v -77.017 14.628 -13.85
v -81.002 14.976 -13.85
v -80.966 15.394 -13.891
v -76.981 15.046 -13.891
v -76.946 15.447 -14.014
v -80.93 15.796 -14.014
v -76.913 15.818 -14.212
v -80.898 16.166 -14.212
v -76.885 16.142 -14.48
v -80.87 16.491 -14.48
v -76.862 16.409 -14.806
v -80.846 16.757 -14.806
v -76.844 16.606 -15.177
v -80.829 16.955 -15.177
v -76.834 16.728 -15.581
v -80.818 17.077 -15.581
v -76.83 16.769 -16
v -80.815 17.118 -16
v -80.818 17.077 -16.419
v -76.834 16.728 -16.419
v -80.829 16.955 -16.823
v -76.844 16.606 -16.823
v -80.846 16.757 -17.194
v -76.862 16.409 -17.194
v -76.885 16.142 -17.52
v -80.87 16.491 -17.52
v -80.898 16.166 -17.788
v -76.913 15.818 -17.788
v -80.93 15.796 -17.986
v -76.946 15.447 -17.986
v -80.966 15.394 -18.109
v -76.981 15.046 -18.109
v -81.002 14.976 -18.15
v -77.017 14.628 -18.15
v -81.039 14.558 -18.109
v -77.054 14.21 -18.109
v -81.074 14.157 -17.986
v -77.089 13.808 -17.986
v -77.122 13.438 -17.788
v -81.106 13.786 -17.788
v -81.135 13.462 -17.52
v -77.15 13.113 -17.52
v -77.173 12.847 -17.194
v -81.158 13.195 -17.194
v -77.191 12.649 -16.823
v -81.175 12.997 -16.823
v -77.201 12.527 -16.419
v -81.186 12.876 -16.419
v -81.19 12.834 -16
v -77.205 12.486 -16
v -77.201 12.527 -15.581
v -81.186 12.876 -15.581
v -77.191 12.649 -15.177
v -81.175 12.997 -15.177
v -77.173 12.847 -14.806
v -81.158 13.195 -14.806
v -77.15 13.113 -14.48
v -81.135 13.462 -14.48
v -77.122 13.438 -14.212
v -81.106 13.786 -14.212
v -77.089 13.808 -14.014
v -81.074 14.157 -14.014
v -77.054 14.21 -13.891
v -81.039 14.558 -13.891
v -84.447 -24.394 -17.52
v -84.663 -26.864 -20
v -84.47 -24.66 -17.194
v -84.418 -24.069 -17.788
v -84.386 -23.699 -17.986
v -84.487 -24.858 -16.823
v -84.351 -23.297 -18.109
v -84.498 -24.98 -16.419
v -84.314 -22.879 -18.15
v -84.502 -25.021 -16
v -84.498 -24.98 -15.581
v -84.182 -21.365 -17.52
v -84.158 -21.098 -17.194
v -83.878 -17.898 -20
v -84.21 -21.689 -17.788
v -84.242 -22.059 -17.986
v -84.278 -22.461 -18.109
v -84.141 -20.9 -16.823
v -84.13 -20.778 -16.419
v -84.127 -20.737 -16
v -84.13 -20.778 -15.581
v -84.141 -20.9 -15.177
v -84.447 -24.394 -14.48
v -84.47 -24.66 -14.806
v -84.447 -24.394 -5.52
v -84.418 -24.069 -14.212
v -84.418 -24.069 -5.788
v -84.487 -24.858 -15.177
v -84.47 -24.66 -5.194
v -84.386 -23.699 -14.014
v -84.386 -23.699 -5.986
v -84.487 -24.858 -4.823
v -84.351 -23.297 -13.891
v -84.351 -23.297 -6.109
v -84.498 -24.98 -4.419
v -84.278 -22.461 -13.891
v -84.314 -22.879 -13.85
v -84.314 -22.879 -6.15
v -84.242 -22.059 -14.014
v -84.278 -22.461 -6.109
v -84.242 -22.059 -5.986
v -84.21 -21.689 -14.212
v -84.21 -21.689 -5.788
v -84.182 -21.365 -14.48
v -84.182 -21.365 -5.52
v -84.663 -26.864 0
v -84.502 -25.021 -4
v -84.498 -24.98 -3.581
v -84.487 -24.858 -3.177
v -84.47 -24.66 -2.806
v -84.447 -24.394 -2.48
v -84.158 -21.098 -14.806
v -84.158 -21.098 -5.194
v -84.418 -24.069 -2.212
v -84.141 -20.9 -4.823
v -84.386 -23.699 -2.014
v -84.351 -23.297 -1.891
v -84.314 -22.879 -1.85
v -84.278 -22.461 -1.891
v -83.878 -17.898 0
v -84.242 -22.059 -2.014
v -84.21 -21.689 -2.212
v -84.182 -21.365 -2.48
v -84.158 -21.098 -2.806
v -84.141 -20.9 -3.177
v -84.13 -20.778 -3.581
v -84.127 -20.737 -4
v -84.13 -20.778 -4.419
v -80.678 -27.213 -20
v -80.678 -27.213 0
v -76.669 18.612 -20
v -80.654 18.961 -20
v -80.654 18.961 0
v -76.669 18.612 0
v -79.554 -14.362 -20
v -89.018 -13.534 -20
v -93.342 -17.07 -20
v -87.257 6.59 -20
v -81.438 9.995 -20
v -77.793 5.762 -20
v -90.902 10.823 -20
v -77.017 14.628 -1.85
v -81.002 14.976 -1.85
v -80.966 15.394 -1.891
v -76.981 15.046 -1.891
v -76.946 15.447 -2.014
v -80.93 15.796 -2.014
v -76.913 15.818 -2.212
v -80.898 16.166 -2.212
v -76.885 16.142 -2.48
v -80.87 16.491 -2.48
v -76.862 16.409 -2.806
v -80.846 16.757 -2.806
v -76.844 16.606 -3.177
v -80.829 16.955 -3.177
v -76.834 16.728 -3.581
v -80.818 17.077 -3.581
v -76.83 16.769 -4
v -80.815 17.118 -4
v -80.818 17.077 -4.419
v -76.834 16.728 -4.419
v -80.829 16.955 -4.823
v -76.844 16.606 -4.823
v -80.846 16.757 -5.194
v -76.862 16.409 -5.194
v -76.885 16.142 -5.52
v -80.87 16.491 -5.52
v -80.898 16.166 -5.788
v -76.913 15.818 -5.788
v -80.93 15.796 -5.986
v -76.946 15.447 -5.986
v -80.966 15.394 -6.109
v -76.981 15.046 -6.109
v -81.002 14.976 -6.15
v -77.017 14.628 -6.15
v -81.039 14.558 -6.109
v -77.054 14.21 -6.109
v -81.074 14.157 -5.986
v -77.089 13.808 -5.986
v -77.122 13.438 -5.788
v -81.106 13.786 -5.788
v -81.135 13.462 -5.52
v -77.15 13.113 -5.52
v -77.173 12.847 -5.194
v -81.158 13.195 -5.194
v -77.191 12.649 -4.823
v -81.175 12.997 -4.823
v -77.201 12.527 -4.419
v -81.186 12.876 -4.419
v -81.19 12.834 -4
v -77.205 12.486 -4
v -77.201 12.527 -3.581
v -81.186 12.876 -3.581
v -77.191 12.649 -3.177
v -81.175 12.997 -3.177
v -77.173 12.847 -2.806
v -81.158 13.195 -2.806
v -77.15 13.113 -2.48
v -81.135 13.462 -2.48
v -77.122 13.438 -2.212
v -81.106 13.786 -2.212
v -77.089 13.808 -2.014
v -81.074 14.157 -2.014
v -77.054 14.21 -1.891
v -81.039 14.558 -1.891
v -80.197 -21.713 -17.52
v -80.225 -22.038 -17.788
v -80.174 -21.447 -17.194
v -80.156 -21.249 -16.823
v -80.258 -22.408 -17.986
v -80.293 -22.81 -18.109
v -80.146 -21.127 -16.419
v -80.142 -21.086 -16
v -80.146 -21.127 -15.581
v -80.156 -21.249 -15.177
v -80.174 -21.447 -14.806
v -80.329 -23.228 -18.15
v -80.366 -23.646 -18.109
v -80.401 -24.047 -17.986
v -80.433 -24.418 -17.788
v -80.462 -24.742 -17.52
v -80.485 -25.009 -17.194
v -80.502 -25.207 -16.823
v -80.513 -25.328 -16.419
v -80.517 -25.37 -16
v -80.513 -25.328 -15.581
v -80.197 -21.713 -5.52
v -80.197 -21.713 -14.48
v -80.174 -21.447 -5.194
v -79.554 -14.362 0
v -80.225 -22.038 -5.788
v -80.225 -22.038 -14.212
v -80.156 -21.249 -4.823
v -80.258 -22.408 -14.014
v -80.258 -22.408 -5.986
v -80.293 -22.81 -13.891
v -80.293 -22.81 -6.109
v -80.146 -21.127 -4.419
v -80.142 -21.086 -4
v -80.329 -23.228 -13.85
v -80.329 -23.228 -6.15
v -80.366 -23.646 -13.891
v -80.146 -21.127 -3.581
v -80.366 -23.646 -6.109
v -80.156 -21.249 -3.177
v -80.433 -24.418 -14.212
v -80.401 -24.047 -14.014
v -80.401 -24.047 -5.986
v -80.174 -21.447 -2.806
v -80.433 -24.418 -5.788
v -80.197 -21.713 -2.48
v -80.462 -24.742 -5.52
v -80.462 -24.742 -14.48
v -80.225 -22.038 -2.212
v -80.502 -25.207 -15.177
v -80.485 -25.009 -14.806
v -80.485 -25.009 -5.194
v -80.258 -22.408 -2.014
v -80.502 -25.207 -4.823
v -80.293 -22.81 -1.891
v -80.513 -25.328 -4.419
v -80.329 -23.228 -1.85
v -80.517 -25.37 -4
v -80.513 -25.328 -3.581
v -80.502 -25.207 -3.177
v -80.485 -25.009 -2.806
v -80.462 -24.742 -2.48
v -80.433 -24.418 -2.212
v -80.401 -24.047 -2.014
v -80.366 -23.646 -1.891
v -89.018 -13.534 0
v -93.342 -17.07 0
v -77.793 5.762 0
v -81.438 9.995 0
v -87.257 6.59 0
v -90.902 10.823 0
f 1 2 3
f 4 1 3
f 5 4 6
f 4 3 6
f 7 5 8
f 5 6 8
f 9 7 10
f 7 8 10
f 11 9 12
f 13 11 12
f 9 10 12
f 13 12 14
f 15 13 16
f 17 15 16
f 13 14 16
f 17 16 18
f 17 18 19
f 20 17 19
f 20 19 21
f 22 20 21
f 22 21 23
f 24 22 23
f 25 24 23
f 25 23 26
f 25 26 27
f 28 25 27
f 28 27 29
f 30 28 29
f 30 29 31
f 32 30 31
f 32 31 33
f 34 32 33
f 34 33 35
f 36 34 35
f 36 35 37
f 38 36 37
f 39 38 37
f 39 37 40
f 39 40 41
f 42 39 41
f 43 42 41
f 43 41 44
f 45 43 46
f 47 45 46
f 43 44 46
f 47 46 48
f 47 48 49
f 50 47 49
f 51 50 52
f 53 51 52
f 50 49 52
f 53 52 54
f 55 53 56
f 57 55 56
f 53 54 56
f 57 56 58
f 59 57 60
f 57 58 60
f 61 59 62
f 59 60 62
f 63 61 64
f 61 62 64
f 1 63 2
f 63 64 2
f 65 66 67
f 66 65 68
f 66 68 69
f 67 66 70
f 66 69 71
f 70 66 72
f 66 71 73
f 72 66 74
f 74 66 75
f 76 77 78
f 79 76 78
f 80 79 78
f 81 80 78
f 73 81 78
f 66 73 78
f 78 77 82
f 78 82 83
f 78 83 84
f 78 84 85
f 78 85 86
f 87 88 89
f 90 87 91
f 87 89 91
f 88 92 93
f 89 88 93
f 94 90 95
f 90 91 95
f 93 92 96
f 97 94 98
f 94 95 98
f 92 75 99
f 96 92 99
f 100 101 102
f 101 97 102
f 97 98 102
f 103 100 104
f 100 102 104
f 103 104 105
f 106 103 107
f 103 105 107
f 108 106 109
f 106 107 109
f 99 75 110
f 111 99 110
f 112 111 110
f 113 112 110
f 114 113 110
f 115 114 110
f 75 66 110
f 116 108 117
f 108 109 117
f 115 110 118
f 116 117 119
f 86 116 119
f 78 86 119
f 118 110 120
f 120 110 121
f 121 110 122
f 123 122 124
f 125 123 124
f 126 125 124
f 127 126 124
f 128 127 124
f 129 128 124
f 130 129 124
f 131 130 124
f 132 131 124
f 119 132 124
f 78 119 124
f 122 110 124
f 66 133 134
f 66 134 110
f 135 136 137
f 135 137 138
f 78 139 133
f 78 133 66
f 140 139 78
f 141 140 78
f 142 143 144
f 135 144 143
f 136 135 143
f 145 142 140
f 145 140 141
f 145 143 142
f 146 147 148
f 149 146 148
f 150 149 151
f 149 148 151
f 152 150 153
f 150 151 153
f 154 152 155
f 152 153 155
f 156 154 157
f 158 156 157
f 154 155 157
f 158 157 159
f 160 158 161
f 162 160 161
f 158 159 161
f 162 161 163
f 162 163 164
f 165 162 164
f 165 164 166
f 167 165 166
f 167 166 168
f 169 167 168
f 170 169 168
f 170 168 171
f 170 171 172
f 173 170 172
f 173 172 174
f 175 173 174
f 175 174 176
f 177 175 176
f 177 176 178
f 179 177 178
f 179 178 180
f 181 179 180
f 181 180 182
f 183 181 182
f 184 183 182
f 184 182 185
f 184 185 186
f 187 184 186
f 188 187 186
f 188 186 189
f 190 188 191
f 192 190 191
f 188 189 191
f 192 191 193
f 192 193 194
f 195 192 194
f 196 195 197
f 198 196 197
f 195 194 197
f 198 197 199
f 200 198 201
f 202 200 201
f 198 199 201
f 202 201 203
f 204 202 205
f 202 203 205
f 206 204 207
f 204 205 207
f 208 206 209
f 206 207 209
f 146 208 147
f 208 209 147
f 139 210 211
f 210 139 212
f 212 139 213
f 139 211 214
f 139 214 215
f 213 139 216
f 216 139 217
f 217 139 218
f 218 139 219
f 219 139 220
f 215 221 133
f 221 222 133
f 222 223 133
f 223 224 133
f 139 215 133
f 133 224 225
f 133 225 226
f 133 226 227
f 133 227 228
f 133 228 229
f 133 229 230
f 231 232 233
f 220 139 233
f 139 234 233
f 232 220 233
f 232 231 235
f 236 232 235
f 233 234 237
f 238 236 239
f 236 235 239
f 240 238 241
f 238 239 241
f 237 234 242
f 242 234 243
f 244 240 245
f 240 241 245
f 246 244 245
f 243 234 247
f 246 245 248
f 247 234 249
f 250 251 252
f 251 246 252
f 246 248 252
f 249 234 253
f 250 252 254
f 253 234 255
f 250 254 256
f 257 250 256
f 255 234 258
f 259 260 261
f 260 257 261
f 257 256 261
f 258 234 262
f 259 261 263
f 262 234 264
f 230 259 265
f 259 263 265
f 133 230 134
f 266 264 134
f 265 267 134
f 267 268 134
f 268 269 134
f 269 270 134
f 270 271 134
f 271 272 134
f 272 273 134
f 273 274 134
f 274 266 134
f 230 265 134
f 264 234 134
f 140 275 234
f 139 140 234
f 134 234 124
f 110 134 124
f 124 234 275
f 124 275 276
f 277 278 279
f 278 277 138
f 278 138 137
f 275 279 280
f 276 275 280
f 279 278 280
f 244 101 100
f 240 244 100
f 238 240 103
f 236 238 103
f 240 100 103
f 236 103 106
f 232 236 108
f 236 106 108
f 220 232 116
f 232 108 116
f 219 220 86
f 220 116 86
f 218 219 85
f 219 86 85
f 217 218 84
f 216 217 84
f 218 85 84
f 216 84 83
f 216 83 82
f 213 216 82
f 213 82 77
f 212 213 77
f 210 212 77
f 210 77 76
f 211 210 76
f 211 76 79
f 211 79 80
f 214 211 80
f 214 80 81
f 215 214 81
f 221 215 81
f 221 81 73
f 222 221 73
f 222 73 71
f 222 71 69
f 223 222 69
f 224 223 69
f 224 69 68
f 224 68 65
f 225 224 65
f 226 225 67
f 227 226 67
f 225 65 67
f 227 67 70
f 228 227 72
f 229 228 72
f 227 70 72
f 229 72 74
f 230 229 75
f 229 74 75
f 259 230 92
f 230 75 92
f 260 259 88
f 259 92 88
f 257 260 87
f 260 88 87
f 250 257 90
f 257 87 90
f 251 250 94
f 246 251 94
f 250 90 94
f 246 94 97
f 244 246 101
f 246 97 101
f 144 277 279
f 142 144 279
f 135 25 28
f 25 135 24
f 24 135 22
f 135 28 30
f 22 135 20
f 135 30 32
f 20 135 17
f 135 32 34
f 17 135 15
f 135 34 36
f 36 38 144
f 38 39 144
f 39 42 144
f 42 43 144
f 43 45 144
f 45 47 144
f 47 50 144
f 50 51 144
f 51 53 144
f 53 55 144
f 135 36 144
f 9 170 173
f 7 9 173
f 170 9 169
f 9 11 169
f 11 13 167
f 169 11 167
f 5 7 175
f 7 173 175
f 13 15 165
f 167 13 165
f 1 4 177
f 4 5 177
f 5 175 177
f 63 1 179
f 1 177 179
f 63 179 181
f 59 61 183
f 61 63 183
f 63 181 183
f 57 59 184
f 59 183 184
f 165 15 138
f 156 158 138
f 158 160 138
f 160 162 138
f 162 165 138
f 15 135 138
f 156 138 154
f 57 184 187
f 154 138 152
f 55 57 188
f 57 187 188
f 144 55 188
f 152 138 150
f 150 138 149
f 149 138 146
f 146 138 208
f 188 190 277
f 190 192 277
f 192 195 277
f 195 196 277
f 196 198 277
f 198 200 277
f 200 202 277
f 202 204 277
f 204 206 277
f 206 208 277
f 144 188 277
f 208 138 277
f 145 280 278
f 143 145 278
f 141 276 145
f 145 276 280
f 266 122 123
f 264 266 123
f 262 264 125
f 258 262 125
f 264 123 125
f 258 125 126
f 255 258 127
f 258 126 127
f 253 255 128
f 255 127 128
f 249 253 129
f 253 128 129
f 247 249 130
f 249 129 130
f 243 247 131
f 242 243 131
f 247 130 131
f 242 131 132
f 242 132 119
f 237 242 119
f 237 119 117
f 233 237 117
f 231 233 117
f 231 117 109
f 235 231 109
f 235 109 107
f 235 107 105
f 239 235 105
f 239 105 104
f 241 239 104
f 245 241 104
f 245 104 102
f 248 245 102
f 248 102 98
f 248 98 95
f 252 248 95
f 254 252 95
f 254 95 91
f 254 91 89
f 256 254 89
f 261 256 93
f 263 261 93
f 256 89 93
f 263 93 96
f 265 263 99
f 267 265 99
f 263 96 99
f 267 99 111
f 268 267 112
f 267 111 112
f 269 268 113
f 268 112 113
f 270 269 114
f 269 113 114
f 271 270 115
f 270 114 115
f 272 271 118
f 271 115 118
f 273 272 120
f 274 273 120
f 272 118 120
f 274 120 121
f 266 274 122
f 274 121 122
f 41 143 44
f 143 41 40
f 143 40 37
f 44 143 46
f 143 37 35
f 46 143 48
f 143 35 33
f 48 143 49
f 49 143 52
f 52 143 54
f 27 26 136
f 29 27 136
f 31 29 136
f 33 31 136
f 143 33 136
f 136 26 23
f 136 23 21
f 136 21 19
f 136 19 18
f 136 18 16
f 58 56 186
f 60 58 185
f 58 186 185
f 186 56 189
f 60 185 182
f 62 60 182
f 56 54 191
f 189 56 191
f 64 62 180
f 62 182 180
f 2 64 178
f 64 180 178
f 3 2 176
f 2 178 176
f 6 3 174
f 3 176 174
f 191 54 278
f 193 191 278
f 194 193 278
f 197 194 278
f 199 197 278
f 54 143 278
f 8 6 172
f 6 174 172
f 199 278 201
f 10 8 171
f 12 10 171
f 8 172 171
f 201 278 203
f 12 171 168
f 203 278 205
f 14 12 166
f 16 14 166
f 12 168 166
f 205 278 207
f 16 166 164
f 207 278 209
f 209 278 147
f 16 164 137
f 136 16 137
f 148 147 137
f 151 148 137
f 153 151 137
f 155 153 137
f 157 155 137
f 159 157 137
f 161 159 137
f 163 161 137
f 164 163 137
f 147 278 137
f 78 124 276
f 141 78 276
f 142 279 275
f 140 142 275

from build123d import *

# Parameters (mm, degrees)
BOSS_EXTRUDE1_DEPTH = 20
SKETCH2_R           = 2.15
CUT_EXTRUDE1_DEPTH  = 5


with BuildPart() as part:
    # Sketch1 → Boss-Extrude1 (new body)
    with BuildSketch(Plane.XY):
        Polygon((-80.653583913, 18.961055491), (-76.668805121, 18.61243252), (-77.793114202, 5.761520915), (-87.256963834, 6.589500471), (-89.017509838, -13.533632431), (-79.553660206, -14.361611987), (-80.677969287, -27.212523592), (-84.662748079, -26.863900621), (-83.878346395, -17.898148338), (-93.342196027, -17.070168782), (-90.90183523, 10.823282764), (-81.437985598, 9.995303208), align=None)
    extrude(amount=-BOSS_EXTRUDE1_DEPTH)

    # Sketch2 → Cut-Extrude1 (cut)
    with BuildSketch(Plane(origin=(-81.687205696, 7.146704453, 0), x_dir=(0, 0, 1), z_dir=(-0.996194698, 0.087155743, 0))):
        with Locations((-4, -30.140520061)):
            Circle(SKETCH2_R)
        with Locations((-16, -30.140520061)):
            Circle(SKETCH2_R)
        with Locations((-4, 7.859479939)):
            Circle(SKETCH2_R)
        with Locations((-16, 7.859479939)):
            Circle(SKETCH2_R)
    extrude(amount=-CUT_EXTRUDE1_DEPTH, mode=Mode.SUBTRACT)


solid = part.part
